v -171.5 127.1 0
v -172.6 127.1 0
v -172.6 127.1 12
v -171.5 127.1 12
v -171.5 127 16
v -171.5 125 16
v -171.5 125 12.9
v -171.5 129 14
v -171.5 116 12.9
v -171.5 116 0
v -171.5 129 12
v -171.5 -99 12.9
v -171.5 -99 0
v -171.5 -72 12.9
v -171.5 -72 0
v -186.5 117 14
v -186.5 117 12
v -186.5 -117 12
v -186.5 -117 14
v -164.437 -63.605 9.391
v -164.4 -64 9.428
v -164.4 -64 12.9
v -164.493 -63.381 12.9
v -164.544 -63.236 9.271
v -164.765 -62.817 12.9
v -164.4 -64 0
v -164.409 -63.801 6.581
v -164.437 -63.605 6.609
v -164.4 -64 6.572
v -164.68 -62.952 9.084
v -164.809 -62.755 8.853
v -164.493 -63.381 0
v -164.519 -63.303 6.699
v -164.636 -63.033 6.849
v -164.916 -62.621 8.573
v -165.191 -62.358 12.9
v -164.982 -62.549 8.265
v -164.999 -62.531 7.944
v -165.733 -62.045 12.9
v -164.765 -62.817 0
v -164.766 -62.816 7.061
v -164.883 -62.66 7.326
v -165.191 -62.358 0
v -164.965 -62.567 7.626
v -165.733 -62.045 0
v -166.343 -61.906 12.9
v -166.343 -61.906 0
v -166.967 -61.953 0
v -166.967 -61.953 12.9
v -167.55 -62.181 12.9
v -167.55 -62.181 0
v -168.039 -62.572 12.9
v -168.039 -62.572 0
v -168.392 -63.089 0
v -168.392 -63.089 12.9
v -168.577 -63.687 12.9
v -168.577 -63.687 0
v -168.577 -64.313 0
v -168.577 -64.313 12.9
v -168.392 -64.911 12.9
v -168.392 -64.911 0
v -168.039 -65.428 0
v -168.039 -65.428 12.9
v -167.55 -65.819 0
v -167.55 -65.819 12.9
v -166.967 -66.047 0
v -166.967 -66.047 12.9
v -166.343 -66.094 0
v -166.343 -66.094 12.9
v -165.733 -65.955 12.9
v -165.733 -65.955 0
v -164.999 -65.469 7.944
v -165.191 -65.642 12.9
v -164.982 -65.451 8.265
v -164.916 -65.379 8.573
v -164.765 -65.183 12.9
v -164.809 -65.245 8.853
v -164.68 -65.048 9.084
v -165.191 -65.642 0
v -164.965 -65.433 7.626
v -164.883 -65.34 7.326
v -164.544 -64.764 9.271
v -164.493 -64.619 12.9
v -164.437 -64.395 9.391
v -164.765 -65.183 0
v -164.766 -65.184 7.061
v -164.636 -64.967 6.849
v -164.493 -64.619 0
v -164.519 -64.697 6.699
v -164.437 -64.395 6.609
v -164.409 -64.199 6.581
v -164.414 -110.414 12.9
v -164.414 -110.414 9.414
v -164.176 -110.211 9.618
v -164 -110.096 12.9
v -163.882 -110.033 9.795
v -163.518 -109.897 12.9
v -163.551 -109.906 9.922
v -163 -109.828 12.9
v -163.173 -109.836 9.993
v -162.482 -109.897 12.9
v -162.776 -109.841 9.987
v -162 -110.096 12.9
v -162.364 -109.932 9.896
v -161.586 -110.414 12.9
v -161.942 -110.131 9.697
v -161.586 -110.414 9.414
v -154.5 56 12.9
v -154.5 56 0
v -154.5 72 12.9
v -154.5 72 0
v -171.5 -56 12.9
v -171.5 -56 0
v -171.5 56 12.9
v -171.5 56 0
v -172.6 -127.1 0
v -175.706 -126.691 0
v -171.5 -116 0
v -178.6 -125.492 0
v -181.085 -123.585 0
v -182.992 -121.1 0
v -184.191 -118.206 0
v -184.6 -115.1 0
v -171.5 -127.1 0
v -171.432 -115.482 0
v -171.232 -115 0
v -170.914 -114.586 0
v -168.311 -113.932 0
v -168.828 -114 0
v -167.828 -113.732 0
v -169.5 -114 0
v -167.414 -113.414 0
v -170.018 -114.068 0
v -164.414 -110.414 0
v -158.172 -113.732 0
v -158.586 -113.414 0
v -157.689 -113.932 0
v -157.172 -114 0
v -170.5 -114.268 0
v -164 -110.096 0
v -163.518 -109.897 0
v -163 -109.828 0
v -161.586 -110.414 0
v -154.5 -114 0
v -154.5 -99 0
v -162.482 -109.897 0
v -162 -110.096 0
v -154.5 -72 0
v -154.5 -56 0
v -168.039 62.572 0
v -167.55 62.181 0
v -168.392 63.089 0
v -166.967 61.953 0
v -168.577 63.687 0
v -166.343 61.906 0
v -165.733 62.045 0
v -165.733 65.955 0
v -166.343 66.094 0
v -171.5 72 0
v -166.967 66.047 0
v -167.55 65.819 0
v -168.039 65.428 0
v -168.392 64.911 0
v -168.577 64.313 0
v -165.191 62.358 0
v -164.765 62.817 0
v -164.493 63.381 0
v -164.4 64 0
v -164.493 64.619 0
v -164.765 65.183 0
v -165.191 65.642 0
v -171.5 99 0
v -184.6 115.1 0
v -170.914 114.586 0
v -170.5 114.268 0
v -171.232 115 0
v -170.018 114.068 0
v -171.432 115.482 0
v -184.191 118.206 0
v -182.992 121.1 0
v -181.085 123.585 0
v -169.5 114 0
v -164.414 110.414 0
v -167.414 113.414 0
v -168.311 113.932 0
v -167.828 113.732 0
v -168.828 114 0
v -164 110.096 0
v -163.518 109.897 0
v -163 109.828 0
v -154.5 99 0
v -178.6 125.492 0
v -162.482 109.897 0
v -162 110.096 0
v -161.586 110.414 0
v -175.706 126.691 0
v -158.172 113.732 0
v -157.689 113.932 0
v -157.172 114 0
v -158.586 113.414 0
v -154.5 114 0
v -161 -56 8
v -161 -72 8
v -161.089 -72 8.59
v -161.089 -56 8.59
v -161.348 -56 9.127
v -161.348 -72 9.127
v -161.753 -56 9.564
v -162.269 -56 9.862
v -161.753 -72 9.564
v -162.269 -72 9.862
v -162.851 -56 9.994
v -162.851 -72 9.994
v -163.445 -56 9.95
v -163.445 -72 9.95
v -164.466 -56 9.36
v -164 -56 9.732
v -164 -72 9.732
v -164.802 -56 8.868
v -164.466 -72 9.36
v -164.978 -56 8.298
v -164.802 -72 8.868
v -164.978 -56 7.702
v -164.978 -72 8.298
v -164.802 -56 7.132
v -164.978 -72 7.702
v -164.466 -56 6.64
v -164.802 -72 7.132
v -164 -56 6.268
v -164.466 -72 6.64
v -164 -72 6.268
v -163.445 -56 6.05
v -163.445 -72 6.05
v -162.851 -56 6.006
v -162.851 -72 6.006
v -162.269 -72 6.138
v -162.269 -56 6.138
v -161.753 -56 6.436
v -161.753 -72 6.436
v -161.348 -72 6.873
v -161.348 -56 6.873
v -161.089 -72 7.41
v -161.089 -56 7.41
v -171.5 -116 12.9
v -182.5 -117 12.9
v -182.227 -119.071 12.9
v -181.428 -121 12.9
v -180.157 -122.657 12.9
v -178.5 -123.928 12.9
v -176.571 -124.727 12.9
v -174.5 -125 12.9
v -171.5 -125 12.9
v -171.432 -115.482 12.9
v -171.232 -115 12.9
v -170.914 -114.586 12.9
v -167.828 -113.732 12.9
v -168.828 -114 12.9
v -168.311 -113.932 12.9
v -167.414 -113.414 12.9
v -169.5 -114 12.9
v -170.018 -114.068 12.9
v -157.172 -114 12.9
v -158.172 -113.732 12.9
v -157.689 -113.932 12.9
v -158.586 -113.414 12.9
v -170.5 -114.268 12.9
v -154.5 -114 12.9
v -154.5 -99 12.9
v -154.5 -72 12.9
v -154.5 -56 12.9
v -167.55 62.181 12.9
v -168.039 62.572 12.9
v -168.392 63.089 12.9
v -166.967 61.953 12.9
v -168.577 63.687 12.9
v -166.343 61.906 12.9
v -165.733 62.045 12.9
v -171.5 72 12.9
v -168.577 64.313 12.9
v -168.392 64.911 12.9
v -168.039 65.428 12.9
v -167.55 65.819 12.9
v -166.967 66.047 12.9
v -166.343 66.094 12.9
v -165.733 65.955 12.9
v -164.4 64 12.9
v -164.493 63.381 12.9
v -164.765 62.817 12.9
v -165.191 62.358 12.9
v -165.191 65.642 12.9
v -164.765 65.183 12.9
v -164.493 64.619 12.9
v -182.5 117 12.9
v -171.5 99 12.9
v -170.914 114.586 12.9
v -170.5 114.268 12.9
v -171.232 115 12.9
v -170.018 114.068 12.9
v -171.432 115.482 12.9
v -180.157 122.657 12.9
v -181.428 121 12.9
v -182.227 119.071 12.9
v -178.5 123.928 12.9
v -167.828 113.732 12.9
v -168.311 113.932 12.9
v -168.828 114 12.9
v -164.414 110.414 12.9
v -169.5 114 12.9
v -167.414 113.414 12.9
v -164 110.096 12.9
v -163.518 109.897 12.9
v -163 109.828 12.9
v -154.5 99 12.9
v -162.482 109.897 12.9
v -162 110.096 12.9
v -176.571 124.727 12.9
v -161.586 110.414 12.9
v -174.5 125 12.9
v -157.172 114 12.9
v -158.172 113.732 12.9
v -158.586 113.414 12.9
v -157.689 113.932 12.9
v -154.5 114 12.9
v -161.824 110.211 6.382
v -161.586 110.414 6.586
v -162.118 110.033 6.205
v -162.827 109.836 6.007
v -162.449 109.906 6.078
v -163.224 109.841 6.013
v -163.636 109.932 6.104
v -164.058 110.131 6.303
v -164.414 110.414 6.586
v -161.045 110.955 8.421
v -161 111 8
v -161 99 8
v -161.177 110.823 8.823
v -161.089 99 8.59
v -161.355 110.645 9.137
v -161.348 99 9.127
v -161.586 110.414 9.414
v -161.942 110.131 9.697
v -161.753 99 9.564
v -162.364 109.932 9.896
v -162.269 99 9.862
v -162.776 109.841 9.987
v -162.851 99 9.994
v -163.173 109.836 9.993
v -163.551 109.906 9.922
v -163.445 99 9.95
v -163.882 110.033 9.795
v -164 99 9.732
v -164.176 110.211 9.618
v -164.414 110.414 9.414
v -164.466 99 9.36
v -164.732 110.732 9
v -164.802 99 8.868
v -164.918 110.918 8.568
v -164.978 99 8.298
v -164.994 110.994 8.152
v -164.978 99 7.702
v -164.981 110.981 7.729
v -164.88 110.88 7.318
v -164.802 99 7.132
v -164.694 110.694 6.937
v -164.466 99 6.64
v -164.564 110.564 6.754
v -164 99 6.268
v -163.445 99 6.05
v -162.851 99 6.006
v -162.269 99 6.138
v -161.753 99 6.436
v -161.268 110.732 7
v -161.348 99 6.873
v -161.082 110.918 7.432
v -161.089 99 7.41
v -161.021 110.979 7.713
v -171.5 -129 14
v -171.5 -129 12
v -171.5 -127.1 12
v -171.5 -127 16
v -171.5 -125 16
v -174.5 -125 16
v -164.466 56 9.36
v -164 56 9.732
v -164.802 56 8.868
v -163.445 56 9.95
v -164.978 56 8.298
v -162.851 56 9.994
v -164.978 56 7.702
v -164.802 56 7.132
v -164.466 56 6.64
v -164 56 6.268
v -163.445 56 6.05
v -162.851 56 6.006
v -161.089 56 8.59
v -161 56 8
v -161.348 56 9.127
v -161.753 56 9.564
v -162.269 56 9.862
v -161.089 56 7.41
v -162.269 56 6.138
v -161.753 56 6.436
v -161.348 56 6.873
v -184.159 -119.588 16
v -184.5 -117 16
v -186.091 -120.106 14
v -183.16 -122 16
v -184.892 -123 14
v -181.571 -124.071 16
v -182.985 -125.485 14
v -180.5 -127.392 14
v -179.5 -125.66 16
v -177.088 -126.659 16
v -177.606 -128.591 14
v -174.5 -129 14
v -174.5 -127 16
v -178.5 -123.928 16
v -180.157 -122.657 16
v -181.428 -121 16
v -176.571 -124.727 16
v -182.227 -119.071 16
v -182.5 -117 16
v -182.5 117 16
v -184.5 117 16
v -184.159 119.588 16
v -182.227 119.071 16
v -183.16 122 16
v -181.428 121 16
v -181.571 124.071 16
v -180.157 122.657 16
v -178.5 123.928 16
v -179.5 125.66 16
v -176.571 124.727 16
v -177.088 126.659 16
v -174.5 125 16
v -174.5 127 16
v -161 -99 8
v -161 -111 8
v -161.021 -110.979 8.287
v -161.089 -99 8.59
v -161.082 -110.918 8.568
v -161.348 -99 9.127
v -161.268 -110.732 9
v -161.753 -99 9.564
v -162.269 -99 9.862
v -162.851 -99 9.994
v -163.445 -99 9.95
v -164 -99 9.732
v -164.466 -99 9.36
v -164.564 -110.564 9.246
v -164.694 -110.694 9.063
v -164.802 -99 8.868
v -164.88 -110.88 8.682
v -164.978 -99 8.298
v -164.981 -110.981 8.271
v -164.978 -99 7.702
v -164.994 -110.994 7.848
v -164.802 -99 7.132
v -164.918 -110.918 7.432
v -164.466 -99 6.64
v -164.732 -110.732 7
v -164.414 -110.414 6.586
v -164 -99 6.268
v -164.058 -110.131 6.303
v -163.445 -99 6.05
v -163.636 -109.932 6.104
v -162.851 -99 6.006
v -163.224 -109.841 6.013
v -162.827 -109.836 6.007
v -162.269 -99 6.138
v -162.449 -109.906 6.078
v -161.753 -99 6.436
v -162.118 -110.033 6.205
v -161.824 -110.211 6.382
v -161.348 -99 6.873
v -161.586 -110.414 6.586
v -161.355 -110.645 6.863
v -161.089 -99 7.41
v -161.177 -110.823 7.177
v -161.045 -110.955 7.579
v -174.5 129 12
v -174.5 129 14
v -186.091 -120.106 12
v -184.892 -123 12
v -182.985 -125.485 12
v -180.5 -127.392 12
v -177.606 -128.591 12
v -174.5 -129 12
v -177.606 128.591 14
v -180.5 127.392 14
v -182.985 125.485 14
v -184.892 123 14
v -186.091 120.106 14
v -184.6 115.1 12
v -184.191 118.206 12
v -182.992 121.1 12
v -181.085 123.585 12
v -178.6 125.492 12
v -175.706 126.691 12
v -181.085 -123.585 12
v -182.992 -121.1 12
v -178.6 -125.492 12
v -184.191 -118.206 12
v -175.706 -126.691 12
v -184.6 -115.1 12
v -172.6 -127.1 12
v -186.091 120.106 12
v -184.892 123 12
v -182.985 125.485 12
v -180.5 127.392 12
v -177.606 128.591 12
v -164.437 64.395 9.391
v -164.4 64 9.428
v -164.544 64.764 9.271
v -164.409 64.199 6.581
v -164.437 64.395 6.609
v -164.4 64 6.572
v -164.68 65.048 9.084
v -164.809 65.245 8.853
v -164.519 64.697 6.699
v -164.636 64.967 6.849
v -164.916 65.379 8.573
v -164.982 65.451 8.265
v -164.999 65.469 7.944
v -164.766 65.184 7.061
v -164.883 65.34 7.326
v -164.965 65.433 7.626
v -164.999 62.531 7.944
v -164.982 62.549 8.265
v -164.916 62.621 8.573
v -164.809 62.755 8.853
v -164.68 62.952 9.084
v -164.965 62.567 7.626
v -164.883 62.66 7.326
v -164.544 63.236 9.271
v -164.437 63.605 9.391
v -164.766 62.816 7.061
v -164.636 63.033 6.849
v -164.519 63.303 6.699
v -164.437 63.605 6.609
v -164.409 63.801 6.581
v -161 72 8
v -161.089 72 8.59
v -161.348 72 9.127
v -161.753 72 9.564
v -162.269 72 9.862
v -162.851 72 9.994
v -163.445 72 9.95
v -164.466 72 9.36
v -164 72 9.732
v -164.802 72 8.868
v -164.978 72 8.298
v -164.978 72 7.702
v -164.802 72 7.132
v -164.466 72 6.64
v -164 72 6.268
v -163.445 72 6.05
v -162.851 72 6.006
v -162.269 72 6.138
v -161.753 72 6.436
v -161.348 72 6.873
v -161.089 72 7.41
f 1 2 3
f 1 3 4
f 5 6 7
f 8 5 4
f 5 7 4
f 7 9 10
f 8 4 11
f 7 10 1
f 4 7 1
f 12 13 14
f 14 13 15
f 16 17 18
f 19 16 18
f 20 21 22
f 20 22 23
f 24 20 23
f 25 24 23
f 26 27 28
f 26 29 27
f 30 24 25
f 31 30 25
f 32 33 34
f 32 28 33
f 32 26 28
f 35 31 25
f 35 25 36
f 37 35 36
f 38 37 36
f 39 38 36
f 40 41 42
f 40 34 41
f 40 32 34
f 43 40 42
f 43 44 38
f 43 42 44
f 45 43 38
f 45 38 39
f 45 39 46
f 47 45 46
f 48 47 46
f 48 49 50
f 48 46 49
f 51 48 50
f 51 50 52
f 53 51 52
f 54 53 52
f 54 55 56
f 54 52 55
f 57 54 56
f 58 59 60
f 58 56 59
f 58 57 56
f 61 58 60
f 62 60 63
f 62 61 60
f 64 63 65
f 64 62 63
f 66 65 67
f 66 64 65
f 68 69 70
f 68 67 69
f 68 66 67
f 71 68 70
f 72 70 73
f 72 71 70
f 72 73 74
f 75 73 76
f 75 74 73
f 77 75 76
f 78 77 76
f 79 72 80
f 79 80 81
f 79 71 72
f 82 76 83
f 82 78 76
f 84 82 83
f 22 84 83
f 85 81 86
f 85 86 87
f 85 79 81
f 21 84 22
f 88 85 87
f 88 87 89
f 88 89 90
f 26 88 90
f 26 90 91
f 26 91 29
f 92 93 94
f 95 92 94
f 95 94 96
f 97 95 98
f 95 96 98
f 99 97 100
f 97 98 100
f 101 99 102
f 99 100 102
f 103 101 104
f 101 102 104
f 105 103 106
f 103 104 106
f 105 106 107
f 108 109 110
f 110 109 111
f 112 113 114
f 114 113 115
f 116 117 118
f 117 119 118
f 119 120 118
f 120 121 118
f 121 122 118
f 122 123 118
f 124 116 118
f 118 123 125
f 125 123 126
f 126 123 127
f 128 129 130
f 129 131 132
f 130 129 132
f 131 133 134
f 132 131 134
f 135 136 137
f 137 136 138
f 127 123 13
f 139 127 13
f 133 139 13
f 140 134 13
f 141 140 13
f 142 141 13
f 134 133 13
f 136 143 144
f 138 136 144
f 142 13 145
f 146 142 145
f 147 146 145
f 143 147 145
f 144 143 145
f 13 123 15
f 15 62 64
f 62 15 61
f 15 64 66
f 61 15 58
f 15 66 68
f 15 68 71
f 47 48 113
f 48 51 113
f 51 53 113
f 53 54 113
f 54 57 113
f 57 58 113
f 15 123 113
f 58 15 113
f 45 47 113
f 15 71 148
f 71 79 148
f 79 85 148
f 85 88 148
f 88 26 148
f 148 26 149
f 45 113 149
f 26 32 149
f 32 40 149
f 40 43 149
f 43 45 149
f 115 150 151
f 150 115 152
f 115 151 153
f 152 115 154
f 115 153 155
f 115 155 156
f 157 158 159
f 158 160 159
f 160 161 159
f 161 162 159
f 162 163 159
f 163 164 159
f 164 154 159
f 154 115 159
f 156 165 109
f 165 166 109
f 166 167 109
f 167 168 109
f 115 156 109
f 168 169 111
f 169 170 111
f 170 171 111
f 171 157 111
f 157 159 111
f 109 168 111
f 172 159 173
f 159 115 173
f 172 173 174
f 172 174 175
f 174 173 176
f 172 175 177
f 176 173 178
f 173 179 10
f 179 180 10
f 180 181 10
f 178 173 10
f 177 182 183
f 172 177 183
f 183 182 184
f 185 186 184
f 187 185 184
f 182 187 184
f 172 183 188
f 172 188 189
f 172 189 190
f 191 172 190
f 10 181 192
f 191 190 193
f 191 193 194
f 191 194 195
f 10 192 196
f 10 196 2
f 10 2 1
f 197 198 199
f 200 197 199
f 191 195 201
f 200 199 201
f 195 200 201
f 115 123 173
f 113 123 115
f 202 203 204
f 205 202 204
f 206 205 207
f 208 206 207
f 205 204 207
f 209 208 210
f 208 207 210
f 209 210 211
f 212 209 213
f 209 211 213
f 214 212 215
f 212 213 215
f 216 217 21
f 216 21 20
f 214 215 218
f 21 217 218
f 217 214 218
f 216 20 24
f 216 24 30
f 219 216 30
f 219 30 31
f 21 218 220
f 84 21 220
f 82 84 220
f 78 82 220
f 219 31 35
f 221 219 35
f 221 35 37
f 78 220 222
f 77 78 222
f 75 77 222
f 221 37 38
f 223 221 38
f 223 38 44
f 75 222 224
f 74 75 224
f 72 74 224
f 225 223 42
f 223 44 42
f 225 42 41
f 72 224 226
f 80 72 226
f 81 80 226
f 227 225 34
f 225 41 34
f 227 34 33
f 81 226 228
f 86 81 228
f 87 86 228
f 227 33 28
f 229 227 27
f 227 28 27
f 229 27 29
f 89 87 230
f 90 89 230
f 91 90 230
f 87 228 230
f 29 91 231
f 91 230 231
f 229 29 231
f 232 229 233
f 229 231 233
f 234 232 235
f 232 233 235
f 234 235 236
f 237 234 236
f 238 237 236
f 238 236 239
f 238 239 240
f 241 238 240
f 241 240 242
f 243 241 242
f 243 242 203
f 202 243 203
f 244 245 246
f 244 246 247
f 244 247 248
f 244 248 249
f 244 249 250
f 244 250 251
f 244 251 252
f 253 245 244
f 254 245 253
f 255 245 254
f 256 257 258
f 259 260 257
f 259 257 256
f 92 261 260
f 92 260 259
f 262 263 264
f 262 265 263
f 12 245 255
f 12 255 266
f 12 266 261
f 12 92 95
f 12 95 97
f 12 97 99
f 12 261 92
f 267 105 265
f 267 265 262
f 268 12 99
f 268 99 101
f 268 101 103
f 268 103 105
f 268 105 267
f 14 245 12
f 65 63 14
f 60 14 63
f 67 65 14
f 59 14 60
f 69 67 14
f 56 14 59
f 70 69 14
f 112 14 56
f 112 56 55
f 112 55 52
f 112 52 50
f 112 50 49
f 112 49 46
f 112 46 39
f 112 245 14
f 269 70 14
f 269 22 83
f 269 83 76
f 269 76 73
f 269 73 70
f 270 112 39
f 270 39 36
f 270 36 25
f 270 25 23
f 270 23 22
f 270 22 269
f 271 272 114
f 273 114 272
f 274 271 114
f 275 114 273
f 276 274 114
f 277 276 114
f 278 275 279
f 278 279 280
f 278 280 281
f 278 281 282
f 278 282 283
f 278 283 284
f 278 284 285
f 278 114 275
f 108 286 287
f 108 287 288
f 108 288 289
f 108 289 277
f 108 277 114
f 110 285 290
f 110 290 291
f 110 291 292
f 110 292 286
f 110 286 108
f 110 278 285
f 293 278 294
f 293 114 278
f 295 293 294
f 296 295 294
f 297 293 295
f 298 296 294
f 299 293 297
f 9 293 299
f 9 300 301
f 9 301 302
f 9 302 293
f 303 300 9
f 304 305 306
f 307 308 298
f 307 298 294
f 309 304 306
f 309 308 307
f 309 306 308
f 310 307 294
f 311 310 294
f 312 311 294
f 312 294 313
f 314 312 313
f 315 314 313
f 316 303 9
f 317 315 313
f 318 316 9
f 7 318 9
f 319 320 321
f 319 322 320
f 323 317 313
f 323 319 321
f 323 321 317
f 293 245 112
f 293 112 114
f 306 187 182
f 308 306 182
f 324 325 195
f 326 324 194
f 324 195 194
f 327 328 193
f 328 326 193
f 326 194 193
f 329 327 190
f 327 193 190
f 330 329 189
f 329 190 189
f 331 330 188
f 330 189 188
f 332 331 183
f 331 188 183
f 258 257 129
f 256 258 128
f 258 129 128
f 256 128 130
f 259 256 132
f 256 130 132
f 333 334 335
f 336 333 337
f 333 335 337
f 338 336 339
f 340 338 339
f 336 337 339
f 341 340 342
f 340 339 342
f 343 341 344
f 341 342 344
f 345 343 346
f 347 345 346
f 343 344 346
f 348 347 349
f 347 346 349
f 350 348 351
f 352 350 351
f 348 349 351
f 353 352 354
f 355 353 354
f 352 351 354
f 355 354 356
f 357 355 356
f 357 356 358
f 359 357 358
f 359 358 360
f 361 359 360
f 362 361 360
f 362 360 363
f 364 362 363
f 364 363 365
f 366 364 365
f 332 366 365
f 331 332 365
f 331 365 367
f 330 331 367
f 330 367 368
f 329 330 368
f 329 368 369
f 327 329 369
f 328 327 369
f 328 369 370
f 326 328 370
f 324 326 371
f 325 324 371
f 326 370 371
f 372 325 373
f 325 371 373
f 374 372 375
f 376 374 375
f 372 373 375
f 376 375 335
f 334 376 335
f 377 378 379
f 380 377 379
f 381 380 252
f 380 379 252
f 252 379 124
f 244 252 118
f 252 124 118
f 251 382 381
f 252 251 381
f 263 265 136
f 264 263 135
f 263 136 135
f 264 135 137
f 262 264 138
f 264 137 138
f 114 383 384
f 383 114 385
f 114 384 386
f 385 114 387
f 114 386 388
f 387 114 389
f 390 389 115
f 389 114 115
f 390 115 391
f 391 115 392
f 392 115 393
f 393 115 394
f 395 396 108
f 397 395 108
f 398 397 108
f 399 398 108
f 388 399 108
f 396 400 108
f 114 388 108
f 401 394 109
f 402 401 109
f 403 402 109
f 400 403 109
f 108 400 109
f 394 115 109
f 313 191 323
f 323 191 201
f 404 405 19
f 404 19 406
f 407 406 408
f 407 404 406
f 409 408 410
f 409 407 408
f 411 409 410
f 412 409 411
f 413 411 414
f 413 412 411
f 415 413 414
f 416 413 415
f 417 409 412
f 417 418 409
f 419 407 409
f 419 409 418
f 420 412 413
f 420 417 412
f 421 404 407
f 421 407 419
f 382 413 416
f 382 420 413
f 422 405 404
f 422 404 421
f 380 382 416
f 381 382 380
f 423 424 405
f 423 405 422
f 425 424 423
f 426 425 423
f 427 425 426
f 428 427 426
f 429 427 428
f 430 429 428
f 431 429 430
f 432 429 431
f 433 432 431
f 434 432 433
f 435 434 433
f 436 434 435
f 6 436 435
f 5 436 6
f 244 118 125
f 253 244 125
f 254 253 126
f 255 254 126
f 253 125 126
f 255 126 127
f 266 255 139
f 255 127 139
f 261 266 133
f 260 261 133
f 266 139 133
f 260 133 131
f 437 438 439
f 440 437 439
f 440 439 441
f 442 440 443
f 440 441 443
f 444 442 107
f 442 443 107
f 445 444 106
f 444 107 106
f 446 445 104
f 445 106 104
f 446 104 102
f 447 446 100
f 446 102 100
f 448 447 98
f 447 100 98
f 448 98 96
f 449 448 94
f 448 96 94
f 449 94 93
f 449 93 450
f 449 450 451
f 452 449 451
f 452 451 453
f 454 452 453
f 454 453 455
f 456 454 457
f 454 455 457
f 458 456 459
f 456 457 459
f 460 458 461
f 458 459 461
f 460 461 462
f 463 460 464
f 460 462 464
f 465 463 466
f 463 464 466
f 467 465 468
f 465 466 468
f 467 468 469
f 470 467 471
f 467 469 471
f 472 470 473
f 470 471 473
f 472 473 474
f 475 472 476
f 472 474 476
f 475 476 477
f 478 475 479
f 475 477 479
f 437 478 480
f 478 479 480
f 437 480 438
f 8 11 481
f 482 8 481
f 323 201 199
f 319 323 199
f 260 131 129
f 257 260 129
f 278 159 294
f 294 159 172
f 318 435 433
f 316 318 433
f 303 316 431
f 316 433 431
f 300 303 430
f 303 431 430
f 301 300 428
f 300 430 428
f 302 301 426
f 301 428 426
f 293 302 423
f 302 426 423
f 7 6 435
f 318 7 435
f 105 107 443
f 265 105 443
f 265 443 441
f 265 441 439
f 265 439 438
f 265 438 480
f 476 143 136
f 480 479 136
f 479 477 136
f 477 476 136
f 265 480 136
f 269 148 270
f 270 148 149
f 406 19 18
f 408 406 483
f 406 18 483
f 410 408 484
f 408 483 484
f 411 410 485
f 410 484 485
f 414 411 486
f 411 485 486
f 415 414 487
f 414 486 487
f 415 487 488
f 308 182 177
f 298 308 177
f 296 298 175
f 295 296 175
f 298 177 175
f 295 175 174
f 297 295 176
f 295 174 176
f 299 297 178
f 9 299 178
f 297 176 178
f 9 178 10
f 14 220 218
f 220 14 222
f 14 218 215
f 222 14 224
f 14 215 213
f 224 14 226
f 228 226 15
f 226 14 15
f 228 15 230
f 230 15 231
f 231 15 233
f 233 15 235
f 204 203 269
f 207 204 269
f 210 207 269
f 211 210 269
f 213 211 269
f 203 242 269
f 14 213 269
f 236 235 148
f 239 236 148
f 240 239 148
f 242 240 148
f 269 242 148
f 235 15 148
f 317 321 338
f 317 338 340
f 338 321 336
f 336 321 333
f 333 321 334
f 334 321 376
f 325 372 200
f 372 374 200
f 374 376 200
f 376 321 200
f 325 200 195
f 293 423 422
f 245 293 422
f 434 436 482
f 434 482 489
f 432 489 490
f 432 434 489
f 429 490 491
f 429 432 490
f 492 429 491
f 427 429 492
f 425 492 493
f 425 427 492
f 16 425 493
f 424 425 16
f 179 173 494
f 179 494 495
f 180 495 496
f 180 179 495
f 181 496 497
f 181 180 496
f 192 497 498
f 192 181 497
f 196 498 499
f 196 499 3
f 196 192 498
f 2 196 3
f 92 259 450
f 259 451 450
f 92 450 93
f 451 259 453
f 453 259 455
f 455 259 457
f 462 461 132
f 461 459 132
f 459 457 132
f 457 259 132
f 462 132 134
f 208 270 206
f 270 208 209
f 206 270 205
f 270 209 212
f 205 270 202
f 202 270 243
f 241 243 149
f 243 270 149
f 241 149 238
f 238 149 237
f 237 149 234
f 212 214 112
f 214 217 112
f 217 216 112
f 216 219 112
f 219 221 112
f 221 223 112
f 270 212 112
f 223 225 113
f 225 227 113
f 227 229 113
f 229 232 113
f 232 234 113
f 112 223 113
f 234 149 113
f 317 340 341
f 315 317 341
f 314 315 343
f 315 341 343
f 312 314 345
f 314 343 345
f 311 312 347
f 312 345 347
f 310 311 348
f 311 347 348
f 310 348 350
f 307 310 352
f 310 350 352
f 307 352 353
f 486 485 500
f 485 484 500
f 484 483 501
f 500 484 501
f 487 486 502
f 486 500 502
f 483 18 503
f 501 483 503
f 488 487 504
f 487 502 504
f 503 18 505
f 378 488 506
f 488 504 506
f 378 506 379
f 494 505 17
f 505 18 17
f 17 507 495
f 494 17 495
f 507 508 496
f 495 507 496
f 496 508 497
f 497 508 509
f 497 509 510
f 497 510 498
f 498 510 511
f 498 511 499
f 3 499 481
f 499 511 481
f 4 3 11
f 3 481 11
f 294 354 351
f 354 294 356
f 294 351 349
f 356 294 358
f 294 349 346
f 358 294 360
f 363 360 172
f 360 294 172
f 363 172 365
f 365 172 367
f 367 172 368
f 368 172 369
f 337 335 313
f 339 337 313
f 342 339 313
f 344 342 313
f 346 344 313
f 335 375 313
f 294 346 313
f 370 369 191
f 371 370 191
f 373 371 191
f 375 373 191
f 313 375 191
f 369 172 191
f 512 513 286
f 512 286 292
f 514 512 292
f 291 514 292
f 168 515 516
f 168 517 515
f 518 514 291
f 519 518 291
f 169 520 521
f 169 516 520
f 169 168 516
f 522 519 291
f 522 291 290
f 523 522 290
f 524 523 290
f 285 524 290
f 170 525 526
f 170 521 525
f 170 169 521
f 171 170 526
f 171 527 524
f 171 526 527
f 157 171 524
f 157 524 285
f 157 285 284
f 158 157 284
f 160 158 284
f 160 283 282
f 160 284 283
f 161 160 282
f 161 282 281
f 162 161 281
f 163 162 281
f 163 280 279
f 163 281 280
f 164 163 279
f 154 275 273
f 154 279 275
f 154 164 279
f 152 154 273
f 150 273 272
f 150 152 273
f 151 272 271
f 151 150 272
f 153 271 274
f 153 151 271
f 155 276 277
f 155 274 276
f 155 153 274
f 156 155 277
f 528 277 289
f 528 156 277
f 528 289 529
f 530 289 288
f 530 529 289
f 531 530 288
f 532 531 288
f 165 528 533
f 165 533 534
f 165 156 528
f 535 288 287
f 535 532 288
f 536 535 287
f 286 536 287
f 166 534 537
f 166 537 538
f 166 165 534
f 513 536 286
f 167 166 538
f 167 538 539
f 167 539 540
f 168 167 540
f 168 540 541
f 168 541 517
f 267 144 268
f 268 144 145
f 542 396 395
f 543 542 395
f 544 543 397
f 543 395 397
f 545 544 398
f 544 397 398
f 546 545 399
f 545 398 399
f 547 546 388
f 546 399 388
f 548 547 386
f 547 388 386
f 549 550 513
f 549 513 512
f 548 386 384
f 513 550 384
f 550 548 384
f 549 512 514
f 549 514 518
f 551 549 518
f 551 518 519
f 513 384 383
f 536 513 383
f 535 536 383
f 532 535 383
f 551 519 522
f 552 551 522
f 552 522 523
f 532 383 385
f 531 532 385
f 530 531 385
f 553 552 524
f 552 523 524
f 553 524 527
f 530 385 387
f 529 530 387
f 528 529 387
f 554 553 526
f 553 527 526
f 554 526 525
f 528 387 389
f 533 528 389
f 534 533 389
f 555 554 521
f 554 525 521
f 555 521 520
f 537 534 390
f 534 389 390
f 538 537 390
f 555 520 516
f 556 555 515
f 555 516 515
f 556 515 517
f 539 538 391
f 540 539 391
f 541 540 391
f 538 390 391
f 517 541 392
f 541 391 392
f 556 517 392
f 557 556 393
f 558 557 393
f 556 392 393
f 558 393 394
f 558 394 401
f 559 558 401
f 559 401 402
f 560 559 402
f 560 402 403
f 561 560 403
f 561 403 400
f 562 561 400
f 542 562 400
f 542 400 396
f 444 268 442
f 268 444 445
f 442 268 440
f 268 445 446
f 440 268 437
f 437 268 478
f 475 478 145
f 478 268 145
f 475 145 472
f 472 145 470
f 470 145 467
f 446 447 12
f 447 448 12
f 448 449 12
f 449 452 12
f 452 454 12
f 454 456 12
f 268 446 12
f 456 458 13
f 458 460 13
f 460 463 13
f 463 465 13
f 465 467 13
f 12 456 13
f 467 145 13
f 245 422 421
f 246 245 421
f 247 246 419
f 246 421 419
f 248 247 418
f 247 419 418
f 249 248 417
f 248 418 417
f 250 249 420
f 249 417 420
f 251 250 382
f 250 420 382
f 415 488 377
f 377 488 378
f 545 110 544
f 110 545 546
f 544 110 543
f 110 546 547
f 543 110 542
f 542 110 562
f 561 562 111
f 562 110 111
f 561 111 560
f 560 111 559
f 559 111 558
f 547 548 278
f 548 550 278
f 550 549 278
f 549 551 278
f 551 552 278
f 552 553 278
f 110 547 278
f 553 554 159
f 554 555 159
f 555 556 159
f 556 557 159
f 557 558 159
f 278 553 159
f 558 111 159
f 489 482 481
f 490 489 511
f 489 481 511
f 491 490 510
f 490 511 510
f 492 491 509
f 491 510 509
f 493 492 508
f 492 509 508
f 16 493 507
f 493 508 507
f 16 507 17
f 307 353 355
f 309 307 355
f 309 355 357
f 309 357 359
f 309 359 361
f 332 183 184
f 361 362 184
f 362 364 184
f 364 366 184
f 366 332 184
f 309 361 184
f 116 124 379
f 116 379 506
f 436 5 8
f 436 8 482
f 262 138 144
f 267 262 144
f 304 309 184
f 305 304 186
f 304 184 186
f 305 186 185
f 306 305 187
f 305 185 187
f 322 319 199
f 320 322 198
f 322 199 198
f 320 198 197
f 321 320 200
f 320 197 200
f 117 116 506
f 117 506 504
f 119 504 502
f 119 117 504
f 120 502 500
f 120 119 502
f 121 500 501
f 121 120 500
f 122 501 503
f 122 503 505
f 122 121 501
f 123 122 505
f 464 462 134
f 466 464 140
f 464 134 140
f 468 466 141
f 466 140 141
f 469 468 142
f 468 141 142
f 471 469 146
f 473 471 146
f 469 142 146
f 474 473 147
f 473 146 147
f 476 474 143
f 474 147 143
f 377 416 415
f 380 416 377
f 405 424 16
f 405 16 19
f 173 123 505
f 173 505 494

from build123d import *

# Parameters (mm, degrees)
F0_R     = 2.1
F1_DEPTH = 16
F2_SIZE  = 2
F4_DEPTH = 3.1
F6_DEPTH = 12
F7_R     = 2
F8_DEPTH = 256.101


with BuildPart() as f1:
    # F0 (on Top) → F1 (new body)
    with BuildSketch(Plane.XY):
        with BuildLine():
            Line((-171.5, 129), (-174.5, 129))
            ThreePointArc((-174.5, 129), (-182.985281, 125.485281), (-186.5, 117))
            Line((-186.5, 117), (-186.5, -117))
            ThreePointArc((-186.5, -117), (-182.985281, -125.485281), (-174.5, -129))
            Line((-174.5, -129), (-171.5, -129))
            Line((-171.5, -129), (-171.5, -127.73274))
            Line((-171.5, -127.73274), (-171.5, -116))
            ThreePointArc((-171.5, -116), (-170.914214, -114.585786), (-169.5, -114))
            Line((-169.5, -114), (-168.828427, -114))
            ThreePointArc((-168.828427, -114), (-168.06306, -113.847759), (-167.414214, -113.414214))
            Line((-167.414214, -113.414214), (-164.414214, -110.414214))
            ThreePointArc((-164.414214, -110.414214), (-163, -109.828427), (-161.585786, -110.414214))
            Line((-161.585786, -110.414214), (-158.585786, -113.414214))
            ThreePointArc((-158.585786, -113.414214), (-157.93694, -113.847759), (-157.171573, -114))
            Line((-157.171573, -114), (-154.5, -114))
            Line((-154.5, -114), (-154.5, -99))
            Line((-154.5, -99), (-171.5, -99))
            Line((-171.5, -99), (-171.5, -72))
            Line((-171.5, -72), (-154.5, -72))
            Line((-154.5, -72), (-154.5, -56))
            Line((-154.5, -56), (-171.5, -56))
            Line((-171.5, -56), (-171.5, 56))
            Line((-171.5, 56), (-154.5, 56))
            Line((-154.5, 56), (-154.5, 72))
            Line((-154.5, 72), (-171.5, 72))
            Line((-171.5, 72), (-171.5, 99))
            Line((-171.5, 99), (-154.5, 99))
            Line((-154.5, 99), (-154.5, 114))
            Line((-154.5, 114), (-157.171573, 114))
            ThreePointArc((-157.171573, 114), (-157.93694, 113.847759), (-158.585786, 113.414214))
            Line((-158.585786, 113.414214), (-161.585786, 110.414214))
            ThreePointArc((-161.585786, 110.414214), (-163, 109.828427), (-164.414214, 110.414214))
            Line((-164.414214, 110.414214), (-167.414214, 113.414214))
            ThreePointArc((-167.414214, 113.414214), (-168.06306, 113.847759), (-168.828427, 114))
            Line((-168.828427, 114), (-169.5, 114))
            ThreePointArc((-169.5, 114), (-170.914214, 114.585786), (-171.5, 116))
            Line((-171.5, 116), (-171.5, 127.73274))
            Line((-171.5, 127.73274), (-171.5, 129))
        make_face()
        with Locations((-166.5, -64)):
            Circle(F0_R, mode=Mode.SUBTRACT)
        with Locations((-166.5, 64)):
            Circle(F0_R, mode=Mode.SUBTRACT)
    extrude(amount=F1_DEPTH)

    # F2
    f2_edges = [f1.edges().sort_by_distance(p)[0] for p in [
        (-173, -129, 16),
    ]]
    chamfer(f2_edges, length=F2_SIZE)

    # F3 (on face) → F4 (cut)
    with BuildSketch(Plane.XY.offset(16)):
        with BuildLine():
            ThreePointArc((-174.5, 125), (-180.156854, 122.656854), (-182.5, 117))
            Line((-182.5, 117), (-182.5, -117))
            ThreePointArc((-182.5, -117), (-180.156854, -122.656854), (-174.5, -125))
            Line((-174.5, -125), (-154.5, -125))
            Line((-154.5, -125), (-153.811902, 125))
            Line((-153.811902, 125), (-174.5, 125))
        make_face()
    extrude(amount=-F4_DEPTH, mode=Mode.SUBTRACT)

    # F5 (on face) → F6 (cut)
    with BuildSketch(Plane.XY):
        with BuildLine():
            ThreePointArc((-184.6, 115.1), (-181.085281, 123.585281), (-172.6, 127.1))
            Line((-172.6, 127.1), (-152.206928, 127.1))
            Line((-152.206928, 127.1), (-152.206928, 132.1))
            Line((-152.206928, 132.1), (-172.6, 132.1))
            ThreePointArc((-172.6, 132.1), (-184.620815, 127.120815), (-189.6, 115.1))
            Line((-189.6, 115.1), (-189.6, -115.1))
            ThreePointArc((-189.6, -115.1), (-184.620815, -127.120815), (-172.6, -132.1))
            Line((-172.6, -132.1), (-152.206928, -132.1))
            Line((-152.206928, -132.1), (-152.206928, -127.1))
            Line((-152.206928, -127.1), (-172.6, -127.1))
            ThreePointArc((-172.6, -127.1), (-181.085281, -123.585281), (-184.6, -115.1))
            Line((-184.6, -115.1), (-184.6, 115.1))
        make_face()
    extrude(amount=F6_DEPTH, mode=Mode.SUBTRACT)

    # F7 (on face) → F8 (cut, through all)
    with BuildSketch(Plane.XZ.offset(127.1)):
        with Locations((-163, 8)):
            Circle(F7_R)
        with Locations((163, 8)):
            Circle(F7_R)
    extrude(amount=-F8_DEPTH, mode=Mode.SUBTRACT)


solid = f1.part
